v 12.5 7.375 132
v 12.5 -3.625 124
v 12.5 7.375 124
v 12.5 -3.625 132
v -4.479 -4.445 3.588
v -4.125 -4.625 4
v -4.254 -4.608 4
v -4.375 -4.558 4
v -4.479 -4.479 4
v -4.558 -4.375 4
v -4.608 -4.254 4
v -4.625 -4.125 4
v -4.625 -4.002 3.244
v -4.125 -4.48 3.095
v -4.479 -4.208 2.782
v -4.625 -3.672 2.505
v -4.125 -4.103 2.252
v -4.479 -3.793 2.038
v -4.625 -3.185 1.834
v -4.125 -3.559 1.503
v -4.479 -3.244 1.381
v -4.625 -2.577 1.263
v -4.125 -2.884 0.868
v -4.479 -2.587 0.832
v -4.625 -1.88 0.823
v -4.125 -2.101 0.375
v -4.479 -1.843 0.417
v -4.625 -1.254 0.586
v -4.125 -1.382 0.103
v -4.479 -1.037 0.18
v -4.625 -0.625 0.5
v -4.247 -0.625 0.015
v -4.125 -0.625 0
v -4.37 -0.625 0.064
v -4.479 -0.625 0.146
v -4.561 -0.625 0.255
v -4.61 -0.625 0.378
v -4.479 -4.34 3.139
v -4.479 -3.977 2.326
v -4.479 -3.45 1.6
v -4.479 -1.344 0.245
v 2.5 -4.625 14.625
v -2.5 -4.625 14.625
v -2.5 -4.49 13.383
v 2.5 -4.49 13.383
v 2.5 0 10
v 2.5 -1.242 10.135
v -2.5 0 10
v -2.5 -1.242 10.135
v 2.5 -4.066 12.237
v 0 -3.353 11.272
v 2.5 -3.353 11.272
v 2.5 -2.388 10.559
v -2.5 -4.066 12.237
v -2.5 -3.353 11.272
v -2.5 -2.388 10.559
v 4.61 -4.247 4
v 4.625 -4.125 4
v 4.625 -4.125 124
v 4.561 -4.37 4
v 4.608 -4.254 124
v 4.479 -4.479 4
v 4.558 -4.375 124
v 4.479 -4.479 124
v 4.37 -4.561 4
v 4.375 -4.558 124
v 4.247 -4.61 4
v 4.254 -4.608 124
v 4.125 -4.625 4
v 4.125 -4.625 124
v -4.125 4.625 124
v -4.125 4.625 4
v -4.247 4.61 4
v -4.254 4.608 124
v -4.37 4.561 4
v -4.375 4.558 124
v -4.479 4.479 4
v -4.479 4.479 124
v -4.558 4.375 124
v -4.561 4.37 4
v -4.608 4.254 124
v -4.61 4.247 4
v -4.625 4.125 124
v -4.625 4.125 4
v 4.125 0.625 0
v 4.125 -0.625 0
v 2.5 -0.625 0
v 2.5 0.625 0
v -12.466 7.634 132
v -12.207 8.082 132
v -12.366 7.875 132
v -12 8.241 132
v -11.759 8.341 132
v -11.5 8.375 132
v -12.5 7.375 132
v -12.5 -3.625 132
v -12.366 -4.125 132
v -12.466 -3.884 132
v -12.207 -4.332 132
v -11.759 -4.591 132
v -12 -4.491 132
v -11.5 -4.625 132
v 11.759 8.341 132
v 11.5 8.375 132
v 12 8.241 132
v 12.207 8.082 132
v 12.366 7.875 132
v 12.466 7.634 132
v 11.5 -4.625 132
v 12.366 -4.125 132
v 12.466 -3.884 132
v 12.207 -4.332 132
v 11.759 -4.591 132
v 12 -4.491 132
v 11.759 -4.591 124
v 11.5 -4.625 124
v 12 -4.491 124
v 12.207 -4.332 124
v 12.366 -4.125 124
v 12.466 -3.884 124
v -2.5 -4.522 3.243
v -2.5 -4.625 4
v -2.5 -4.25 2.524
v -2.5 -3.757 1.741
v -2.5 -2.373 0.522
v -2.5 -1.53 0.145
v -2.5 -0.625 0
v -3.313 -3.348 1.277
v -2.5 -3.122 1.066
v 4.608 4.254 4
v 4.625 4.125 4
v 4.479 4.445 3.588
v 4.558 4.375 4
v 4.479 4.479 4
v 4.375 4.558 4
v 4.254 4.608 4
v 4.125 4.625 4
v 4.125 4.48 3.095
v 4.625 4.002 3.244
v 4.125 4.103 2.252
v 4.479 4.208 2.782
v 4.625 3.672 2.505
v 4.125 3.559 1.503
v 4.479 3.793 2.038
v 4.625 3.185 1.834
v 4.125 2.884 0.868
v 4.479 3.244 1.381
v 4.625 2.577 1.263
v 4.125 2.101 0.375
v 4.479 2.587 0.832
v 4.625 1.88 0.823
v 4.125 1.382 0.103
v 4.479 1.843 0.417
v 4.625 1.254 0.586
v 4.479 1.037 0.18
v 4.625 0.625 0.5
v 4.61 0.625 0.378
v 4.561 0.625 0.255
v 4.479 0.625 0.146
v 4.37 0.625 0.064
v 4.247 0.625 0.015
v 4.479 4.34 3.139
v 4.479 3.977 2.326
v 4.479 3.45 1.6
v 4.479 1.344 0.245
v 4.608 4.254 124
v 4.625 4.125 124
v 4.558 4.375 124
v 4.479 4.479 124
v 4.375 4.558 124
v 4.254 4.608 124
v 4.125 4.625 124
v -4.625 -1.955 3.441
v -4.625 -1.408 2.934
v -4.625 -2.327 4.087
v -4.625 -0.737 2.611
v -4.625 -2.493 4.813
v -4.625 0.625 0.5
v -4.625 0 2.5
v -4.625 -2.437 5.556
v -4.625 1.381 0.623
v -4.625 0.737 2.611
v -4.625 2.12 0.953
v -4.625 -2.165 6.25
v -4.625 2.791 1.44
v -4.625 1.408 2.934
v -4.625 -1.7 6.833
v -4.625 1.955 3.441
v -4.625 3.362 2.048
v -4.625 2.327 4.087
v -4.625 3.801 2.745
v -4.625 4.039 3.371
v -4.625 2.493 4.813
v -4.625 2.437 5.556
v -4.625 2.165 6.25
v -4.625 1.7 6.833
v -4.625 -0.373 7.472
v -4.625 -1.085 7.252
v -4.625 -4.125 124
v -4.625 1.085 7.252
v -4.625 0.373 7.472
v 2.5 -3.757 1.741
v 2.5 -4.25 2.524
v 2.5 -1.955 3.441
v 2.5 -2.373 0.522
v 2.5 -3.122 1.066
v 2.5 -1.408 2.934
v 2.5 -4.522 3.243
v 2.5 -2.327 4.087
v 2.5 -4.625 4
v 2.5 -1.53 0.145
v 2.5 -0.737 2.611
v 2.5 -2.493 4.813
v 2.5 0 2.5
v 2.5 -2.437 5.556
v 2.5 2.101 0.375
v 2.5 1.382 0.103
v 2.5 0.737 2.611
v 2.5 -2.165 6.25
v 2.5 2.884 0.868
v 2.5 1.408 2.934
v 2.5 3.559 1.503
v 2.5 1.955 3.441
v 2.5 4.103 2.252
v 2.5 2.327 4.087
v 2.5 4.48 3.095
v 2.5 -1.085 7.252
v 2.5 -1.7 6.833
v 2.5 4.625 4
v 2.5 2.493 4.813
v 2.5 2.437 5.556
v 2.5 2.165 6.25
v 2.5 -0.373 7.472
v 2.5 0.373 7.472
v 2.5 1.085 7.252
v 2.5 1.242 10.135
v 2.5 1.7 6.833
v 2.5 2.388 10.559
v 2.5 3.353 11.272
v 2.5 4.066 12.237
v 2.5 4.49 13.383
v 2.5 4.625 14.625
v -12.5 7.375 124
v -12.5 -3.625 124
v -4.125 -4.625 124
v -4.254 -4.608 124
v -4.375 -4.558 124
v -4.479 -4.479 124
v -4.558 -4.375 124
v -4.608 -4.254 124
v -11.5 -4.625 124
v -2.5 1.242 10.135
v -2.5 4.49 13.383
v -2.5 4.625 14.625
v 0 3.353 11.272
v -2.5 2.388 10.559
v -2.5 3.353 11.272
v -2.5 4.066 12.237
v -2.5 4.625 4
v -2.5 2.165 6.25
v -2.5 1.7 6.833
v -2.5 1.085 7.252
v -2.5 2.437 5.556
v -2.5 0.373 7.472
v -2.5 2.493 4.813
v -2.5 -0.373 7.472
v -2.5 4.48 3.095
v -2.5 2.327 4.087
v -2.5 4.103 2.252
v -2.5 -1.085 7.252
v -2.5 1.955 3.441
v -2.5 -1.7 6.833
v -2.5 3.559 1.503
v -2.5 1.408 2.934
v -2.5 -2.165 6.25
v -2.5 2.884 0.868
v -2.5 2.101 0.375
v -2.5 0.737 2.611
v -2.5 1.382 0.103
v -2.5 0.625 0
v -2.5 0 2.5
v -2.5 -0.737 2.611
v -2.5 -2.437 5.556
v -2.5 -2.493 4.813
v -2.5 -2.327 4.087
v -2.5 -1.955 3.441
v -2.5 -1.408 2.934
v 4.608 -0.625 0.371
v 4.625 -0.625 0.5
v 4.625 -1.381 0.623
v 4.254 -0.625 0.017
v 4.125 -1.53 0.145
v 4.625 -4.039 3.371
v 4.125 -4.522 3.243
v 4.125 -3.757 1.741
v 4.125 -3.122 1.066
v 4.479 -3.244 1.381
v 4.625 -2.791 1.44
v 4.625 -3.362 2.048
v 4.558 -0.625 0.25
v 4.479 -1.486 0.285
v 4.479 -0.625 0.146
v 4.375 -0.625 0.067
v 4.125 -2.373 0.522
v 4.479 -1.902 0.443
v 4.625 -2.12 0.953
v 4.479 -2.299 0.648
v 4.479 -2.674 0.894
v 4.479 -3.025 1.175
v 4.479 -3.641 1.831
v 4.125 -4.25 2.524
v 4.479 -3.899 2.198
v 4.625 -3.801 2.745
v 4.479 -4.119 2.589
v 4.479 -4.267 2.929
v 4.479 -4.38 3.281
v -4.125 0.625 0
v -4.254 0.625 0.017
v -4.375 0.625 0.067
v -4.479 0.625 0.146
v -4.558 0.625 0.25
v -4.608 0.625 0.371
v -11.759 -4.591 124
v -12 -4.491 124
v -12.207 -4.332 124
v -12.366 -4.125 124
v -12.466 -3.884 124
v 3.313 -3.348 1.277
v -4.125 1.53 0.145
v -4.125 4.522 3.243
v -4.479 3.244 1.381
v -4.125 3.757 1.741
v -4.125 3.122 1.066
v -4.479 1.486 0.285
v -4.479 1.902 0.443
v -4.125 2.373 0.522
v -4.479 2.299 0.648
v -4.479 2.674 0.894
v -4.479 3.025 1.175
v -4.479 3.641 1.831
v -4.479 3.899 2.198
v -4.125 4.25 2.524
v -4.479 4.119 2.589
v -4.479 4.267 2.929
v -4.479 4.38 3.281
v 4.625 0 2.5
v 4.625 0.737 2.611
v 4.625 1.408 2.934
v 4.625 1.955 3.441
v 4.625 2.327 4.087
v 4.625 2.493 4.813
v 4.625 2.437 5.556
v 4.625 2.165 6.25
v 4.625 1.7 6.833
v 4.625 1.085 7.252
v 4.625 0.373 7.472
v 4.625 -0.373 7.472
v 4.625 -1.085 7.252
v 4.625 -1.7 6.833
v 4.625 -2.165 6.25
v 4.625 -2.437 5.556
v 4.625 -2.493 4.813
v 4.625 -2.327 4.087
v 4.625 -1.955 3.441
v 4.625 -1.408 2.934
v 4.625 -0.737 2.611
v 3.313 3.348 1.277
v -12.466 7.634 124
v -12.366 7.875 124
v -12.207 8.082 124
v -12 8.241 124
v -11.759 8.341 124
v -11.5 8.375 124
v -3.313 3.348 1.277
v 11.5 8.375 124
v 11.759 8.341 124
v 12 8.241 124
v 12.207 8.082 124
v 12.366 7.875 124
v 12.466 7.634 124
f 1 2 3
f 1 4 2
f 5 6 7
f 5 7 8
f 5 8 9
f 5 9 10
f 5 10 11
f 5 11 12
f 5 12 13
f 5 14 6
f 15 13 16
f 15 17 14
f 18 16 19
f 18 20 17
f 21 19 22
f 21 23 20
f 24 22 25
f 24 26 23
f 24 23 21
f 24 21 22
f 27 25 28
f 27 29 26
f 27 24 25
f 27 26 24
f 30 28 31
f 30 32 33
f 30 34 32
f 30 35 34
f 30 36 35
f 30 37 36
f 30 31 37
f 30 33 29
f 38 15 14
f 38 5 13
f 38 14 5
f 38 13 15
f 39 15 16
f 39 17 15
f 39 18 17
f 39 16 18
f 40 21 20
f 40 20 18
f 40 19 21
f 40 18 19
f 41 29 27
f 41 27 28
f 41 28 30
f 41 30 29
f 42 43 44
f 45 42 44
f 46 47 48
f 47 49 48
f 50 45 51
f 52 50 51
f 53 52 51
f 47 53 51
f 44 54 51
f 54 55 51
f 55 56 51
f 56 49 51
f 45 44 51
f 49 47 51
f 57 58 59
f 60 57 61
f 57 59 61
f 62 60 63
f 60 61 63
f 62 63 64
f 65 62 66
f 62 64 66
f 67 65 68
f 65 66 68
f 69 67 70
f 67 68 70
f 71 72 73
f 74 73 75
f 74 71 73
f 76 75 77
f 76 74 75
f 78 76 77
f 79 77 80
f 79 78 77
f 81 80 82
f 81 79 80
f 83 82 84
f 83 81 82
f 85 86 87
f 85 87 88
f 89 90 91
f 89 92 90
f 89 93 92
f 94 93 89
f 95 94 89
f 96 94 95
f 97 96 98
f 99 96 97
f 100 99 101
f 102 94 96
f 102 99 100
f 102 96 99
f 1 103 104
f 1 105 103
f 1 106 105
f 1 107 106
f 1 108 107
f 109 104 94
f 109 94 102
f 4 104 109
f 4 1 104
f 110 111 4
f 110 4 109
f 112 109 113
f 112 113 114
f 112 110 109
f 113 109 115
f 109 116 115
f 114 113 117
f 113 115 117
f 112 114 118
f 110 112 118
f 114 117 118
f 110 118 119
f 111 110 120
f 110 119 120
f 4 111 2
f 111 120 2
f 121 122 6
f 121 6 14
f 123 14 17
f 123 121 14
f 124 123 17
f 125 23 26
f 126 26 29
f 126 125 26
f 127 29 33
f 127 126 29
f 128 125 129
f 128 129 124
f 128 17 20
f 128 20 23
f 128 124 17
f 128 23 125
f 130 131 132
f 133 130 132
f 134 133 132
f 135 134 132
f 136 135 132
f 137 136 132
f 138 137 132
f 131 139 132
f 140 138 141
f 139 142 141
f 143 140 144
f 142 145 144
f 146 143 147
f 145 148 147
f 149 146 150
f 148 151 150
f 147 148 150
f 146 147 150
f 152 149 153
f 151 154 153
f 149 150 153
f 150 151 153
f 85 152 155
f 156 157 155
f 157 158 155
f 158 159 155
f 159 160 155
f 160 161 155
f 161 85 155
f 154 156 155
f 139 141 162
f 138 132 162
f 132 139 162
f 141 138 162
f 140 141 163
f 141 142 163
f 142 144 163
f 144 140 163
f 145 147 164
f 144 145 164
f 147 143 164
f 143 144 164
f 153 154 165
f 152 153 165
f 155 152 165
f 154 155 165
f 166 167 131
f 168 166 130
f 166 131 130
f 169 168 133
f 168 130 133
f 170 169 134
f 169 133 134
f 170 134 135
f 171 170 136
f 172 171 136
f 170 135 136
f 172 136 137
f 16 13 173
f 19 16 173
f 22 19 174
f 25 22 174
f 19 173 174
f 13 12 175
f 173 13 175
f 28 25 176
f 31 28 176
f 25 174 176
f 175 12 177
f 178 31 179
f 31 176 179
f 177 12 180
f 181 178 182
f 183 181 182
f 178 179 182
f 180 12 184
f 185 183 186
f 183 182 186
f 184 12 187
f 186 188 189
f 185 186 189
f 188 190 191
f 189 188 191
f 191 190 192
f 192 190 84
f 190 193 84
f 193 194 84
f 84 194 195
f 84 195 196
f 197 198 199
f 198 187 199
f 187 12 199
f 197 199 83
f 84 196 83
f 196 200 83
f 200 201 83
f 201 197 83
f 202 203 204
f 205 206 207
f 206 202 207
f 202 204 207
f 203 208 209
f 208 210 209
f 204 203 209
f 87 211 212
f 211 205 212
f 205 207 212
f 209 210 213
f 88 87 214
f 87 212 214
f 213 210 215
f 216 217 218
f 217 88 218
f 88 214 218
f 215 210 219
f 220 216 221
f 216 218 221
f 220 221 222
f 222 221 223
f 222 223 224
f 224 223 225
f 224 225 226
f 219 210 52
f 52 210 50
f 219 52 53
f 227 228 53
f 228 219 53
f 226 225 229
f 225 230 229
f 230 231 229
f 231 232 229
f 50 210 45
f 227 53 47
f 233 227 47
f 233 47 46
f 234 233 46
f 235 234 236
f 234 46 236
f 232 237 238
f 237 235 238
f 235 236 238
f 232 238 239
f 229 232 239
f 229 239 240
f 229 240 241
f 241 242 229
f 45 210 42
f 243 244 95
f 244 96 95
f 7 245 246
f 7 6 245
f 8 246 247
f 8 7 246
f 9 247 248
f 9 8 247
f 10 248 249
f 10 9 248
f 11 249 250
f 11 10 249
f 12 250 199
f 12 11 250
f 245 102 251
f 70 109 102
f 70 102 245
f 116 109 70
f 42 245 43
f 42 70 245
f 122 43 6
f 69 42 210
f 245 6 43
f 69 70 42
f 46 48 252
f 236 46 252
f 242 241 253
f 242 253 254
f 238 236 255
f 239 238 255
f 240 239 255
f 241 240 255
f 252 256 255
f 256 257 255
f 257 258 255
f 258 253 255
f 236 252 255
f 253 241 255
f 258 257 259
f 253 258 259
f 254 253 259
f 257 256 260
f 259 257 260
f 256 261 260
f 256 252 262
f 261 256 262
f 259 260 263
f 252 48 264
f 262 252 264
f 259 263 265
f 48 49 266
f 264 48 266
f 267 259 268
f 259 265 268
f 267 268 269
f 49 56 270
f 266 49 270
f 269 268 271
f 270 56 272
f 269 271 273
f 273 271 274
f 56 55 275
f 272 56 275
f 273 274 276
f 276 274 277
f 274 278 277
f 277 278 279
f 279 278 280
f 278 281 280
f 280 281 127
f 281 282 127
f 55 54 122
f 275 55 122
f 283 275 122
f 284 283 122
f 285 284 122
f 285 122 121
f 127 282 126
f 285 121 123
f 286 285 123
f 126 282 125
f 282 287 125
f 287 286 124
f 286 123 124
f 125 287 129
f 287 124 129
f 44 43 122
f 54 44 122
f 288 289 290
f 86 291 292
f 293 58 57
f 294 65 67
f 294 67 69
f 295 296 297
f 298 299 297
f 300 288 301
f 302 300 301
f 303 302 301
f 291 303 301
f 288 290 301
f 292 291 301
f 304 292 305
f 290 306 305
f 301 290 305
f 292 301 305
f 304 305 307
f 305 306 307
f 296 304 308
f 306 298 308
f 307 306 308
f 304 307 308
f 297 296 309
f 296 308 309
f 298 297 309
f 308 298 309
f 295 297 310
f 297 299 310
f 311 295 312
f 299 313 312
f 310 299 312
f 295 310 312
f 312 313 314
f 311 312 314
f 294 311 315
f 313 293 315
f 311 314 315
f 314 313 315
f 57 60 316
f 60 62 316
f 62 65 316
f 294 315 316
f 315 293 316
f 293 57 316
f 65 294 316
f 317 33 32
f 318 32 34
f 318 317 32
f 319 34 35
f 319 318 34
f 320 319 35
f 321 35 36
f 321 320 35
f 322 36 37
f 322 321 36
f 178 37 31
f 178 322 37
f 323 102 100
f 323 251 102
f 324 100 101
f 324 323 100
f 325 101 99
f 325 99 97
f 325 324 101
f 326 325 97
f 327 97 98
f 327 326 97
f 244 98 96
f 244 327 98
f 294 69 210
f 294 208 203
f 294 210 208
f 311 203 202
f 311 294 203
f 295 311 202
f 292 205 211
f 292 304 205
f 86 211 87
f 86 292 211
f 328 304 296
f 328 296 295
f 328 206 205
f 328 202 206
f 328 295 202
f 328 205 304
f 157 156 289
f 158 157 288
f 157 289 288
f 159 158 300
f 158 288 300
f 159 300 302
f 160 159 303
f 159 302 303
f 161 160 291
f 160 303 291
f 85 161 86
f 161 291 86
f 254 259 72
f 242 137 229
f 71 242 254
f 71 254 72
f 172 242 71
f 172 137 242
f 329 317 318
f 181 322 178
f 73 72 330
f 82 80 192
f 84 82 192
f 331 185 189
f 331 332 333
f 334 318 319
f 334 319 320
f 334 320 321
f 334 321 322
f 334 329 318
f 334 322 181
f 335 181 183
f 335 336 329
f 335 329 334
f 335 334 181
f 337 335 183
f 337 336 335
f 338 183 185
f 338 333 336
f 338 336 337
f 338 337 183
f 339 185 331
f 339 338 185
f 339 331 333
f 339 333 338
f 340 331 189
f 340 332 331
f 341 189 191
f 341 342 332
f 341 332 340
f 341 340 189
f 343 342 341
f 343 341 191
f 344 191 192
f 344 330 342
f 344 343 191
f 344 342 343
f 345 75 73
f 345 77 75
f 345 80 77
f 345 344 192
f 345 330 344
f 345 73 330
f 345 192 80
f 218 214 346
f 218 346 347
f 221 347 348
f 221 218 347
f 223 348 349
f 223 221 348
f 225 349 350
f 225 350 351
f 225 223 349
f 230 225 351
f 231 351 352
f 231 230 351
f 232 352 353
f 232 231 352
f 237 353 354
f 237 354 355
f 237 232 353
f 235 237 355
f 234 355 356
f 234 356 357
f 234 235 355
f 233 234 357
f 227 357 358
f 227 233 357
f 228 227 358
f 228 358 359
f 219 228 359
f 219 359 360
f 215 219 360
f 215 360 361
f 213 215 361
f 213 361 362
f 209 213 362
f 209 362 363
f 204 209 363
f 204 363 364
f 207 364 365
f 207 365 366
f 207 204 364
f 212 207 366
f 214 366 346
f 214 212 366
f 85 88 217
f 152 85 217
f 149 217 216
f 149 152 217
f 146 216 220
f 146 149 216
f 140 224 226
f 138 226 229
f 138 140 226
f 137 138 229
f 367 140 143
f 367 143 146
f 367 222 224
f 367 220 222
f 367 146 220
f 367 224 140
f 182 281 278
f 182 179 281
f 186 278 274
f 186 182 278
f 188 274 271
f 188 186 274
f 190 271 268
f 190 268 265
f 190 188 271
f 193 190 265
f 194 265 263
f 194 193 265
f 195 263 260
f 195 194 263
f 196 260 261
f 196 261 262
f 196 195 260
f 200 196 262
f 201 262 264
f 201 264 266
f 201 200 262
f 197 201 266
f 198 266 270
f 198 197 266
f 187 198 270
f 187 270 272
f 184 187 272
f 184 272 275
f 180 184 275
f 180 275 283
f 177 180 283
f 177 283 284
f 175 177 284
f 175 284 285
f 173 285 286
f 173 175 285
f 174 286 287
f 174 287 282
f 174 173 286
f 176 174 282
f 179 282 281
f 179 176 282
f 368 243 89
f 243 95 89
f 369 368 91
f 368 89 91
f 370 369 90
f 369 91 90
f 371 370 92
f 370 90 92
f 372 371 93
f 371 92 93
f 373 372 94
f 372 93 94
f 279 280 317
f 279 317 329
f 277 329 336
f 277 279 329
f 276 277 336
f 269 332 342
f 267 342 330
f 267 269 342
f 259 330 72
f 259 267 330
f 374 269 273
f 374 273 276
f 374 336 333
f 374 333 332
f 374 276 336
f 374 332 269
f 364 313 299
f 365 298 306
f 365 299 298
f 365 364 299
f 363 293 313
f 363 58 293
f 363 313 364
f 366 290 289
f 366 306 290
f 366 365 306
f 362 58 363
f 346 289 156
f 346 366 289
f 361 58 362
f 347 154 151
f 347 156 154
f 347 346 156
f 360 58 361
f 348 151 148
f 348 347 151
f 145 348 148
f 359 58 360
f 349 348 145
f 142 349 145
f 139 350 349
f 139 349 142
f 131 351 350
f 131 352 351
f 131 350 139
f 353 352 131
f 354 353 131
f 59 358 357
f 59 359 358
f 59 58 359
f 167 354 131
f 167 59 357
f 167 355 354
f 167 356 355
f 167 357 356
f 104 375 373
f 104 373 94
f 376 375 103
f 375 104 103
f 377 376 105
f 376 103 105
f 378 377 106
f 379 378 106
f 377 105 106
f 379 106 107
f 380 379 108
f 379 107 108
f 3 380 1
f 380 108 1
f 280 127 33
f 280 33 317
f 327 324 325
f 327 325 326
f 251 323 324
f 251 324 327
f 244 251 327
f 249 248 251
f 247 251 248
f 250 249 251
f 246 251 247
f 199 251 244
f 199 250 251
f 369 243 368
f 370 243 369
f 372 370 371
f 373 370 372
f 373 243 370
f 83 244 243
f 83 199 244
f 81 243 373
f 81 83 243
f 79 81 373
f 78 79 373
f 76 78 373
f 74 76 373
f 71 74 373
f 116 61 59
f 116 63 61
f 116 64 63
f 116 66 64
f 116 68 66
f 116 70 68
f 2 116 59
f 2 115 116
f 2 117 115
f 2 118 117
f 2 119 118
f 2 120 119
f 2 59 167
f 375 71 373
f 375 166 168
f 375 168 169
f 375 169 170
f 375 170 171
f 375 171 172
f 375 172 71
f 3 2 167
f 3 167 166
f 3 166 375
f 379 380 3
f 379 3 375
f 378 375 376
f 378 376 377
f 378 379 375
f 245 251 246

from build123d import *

# Parameters (mm, degrees)
CROQUIS1_W              = 9.25
CROQUIS1_H              = 114
CROQUIS1_H_2            = 10
CROQUIS1_R              = 2.5
SALIENTE_EXTRUIR1_DEPTH = 4.625
SALIENTE_EXTRUIR2_DEPTH = 12.5
CROQUIS1_4_W            = 9.25
CROQUIS1_4_H            = 10
CROQUIS1_4_R            = 2.5
CORTAR_EXTRUIR1_DEPTH   = 2.5
REDONDEO1_SIZE          = 4
REDONDEO2_SIZE          = 4.625
REDONDEO3_R             = 0.5
REDONDEO4_R             = 1


with BuildPart() as part:
    # Croquis1 → Saliente-Extruir1 (new, symmetric)
    # profile 1 of 2: a face of its own
    with BuildSketch(Plane.YZ):
        with Locations((0, 67)):
            Rectangle(CROQUIS1_W, CROQUIS1_H)
    # profile 2 of 2: a face of its own
    with BuildSketch(Plane.YZ):
        with Locations((0, 5)):
            Rectangle(CROQUIS1_W, CROQUIS1_H_2)
        with Locations(Location((0, 5, 0), (0, 0, 270))):
            Circle(CROQUIS1_R, mode=Mode.SUBTRACT)
    extrude(amount=SALIENTE_EXTRUIR1_DEPTH, both=True)

    # Croquis1<3> → Saliente-Extruir2 (add, symmetric)
    with BuildSketch(Plane.YZ):
        Polygon((4.625, 132), (-4.625, 132), (-4.625, 124), (4.625, 124), (8.375, 124), (8.375, 132), align=None)
    extrude(amount=SALIENTE_EXTRUIR2_DEPTH, both=True)

    # Croquis1<4> → Cortar-Extruir1 (cut, symmetric)
    with BuildSketch(Plane.YZ):
        with Locations((0, 5)):
            Rectangle(CROQUIS1_4_W, CROQUIS1_4_H)
        with Locations(Location((0, 5, 0), (0, 0, 270))):
            Circle(CROQUIS1_4_R, mode=Mode.SUBTRACT)
    extrude(amount=CORTAR_EXTRUIR1_DEPTH, both=True, mode=Mode.SUBTRACT)

    # Redondeo1
    # a fillet whose section is not a circle: 4 mm, written as the material it takes off along each edge
    with BuildSketch(Plane(origin=(14.625, -4.625, 0), x_dir=(0, 0, 1), z_dir=(-1, 0, 0)), Plane(origin=(14.625, 4.625, 0), x_dir=(0, -1, 0), z_dir=(-1, 0, 0))) as redondeo1_piece_1:
        with BuildLine():
            Bezier((REDONDEO1_SIZE, 0), (0, 0), (0, REDONDEO1_SIZE), weights=[1, 0.565685425, 1])
            Line((0, REDONDEO1_SIZE), (0, 0))
            Line((0, 0), (REDONDEO1_SIZE, 0))
        make_face()
    extrude(amount=22.125, mode=Mode.SUBTRACT)

    # Redondeo2
    # a fillet whose section is not a circle: 4.625 mm, written as the material it takes off along each edge
    with BuildSketch(Plane(origin=(-2.5, 4.625, 10), x_dir=(0, -1, 0), z_dir=(1, 0, 0)), Plane(origin=(-2.5, -4.625, 10), x_dir=(0, 0, 1), z_dir=(1, 0, 0))) as redondeo2_piece_1:
        with BuildLine():
            Bezier((REDONDEO2_SIZE, 0), (0, 0), (0, -REDONDEO2_SIZE), weights=[1, 0.817592216, 1])
            Line((0, -REDONDEO2_SIZE), (0, 0))
            Line((0, 0), (REDONDEO2_SIZE, 0))
        make_face()
    extrude(amount=5, mode=Mode.SUBTRACT)

    # Redondeo3
    redondeo3_edges = [part.edges().sort_by_distance(p)[0] for p in [
        (4.625, 4.625, 64),
        (4.625, 0, 0),
        (4.625, -4.625, 64),
        (4.625, 3.347604191, 1.277395809),
        (4.625, -3.347604191, 1.277395809),
        (-4.625, 0, 0),
        (-4.625, 3.347604191, 1.277395809),
        (-4.625, -3.347604191, 1.277395809),
        (-4.625, 4.625, 64),
        (-4.625, -4.625, 64),
    ]]
    fillet(redondeo3_edges, radius=REDONDEO3_R)

    # Redondeo4
    redondeo4_edges = [part.edges().sort_by_distance(p)[0] for p in [
        (12.5, 8.375, 128),
        (-12.5, -4.625, 128),
        (12.5, -4.625, 128),
        (-12.5, 8.375, 128),
    ]]
    fillet(redondeo4_edges, radius=REDONDEO4_R)


solid = part.part
